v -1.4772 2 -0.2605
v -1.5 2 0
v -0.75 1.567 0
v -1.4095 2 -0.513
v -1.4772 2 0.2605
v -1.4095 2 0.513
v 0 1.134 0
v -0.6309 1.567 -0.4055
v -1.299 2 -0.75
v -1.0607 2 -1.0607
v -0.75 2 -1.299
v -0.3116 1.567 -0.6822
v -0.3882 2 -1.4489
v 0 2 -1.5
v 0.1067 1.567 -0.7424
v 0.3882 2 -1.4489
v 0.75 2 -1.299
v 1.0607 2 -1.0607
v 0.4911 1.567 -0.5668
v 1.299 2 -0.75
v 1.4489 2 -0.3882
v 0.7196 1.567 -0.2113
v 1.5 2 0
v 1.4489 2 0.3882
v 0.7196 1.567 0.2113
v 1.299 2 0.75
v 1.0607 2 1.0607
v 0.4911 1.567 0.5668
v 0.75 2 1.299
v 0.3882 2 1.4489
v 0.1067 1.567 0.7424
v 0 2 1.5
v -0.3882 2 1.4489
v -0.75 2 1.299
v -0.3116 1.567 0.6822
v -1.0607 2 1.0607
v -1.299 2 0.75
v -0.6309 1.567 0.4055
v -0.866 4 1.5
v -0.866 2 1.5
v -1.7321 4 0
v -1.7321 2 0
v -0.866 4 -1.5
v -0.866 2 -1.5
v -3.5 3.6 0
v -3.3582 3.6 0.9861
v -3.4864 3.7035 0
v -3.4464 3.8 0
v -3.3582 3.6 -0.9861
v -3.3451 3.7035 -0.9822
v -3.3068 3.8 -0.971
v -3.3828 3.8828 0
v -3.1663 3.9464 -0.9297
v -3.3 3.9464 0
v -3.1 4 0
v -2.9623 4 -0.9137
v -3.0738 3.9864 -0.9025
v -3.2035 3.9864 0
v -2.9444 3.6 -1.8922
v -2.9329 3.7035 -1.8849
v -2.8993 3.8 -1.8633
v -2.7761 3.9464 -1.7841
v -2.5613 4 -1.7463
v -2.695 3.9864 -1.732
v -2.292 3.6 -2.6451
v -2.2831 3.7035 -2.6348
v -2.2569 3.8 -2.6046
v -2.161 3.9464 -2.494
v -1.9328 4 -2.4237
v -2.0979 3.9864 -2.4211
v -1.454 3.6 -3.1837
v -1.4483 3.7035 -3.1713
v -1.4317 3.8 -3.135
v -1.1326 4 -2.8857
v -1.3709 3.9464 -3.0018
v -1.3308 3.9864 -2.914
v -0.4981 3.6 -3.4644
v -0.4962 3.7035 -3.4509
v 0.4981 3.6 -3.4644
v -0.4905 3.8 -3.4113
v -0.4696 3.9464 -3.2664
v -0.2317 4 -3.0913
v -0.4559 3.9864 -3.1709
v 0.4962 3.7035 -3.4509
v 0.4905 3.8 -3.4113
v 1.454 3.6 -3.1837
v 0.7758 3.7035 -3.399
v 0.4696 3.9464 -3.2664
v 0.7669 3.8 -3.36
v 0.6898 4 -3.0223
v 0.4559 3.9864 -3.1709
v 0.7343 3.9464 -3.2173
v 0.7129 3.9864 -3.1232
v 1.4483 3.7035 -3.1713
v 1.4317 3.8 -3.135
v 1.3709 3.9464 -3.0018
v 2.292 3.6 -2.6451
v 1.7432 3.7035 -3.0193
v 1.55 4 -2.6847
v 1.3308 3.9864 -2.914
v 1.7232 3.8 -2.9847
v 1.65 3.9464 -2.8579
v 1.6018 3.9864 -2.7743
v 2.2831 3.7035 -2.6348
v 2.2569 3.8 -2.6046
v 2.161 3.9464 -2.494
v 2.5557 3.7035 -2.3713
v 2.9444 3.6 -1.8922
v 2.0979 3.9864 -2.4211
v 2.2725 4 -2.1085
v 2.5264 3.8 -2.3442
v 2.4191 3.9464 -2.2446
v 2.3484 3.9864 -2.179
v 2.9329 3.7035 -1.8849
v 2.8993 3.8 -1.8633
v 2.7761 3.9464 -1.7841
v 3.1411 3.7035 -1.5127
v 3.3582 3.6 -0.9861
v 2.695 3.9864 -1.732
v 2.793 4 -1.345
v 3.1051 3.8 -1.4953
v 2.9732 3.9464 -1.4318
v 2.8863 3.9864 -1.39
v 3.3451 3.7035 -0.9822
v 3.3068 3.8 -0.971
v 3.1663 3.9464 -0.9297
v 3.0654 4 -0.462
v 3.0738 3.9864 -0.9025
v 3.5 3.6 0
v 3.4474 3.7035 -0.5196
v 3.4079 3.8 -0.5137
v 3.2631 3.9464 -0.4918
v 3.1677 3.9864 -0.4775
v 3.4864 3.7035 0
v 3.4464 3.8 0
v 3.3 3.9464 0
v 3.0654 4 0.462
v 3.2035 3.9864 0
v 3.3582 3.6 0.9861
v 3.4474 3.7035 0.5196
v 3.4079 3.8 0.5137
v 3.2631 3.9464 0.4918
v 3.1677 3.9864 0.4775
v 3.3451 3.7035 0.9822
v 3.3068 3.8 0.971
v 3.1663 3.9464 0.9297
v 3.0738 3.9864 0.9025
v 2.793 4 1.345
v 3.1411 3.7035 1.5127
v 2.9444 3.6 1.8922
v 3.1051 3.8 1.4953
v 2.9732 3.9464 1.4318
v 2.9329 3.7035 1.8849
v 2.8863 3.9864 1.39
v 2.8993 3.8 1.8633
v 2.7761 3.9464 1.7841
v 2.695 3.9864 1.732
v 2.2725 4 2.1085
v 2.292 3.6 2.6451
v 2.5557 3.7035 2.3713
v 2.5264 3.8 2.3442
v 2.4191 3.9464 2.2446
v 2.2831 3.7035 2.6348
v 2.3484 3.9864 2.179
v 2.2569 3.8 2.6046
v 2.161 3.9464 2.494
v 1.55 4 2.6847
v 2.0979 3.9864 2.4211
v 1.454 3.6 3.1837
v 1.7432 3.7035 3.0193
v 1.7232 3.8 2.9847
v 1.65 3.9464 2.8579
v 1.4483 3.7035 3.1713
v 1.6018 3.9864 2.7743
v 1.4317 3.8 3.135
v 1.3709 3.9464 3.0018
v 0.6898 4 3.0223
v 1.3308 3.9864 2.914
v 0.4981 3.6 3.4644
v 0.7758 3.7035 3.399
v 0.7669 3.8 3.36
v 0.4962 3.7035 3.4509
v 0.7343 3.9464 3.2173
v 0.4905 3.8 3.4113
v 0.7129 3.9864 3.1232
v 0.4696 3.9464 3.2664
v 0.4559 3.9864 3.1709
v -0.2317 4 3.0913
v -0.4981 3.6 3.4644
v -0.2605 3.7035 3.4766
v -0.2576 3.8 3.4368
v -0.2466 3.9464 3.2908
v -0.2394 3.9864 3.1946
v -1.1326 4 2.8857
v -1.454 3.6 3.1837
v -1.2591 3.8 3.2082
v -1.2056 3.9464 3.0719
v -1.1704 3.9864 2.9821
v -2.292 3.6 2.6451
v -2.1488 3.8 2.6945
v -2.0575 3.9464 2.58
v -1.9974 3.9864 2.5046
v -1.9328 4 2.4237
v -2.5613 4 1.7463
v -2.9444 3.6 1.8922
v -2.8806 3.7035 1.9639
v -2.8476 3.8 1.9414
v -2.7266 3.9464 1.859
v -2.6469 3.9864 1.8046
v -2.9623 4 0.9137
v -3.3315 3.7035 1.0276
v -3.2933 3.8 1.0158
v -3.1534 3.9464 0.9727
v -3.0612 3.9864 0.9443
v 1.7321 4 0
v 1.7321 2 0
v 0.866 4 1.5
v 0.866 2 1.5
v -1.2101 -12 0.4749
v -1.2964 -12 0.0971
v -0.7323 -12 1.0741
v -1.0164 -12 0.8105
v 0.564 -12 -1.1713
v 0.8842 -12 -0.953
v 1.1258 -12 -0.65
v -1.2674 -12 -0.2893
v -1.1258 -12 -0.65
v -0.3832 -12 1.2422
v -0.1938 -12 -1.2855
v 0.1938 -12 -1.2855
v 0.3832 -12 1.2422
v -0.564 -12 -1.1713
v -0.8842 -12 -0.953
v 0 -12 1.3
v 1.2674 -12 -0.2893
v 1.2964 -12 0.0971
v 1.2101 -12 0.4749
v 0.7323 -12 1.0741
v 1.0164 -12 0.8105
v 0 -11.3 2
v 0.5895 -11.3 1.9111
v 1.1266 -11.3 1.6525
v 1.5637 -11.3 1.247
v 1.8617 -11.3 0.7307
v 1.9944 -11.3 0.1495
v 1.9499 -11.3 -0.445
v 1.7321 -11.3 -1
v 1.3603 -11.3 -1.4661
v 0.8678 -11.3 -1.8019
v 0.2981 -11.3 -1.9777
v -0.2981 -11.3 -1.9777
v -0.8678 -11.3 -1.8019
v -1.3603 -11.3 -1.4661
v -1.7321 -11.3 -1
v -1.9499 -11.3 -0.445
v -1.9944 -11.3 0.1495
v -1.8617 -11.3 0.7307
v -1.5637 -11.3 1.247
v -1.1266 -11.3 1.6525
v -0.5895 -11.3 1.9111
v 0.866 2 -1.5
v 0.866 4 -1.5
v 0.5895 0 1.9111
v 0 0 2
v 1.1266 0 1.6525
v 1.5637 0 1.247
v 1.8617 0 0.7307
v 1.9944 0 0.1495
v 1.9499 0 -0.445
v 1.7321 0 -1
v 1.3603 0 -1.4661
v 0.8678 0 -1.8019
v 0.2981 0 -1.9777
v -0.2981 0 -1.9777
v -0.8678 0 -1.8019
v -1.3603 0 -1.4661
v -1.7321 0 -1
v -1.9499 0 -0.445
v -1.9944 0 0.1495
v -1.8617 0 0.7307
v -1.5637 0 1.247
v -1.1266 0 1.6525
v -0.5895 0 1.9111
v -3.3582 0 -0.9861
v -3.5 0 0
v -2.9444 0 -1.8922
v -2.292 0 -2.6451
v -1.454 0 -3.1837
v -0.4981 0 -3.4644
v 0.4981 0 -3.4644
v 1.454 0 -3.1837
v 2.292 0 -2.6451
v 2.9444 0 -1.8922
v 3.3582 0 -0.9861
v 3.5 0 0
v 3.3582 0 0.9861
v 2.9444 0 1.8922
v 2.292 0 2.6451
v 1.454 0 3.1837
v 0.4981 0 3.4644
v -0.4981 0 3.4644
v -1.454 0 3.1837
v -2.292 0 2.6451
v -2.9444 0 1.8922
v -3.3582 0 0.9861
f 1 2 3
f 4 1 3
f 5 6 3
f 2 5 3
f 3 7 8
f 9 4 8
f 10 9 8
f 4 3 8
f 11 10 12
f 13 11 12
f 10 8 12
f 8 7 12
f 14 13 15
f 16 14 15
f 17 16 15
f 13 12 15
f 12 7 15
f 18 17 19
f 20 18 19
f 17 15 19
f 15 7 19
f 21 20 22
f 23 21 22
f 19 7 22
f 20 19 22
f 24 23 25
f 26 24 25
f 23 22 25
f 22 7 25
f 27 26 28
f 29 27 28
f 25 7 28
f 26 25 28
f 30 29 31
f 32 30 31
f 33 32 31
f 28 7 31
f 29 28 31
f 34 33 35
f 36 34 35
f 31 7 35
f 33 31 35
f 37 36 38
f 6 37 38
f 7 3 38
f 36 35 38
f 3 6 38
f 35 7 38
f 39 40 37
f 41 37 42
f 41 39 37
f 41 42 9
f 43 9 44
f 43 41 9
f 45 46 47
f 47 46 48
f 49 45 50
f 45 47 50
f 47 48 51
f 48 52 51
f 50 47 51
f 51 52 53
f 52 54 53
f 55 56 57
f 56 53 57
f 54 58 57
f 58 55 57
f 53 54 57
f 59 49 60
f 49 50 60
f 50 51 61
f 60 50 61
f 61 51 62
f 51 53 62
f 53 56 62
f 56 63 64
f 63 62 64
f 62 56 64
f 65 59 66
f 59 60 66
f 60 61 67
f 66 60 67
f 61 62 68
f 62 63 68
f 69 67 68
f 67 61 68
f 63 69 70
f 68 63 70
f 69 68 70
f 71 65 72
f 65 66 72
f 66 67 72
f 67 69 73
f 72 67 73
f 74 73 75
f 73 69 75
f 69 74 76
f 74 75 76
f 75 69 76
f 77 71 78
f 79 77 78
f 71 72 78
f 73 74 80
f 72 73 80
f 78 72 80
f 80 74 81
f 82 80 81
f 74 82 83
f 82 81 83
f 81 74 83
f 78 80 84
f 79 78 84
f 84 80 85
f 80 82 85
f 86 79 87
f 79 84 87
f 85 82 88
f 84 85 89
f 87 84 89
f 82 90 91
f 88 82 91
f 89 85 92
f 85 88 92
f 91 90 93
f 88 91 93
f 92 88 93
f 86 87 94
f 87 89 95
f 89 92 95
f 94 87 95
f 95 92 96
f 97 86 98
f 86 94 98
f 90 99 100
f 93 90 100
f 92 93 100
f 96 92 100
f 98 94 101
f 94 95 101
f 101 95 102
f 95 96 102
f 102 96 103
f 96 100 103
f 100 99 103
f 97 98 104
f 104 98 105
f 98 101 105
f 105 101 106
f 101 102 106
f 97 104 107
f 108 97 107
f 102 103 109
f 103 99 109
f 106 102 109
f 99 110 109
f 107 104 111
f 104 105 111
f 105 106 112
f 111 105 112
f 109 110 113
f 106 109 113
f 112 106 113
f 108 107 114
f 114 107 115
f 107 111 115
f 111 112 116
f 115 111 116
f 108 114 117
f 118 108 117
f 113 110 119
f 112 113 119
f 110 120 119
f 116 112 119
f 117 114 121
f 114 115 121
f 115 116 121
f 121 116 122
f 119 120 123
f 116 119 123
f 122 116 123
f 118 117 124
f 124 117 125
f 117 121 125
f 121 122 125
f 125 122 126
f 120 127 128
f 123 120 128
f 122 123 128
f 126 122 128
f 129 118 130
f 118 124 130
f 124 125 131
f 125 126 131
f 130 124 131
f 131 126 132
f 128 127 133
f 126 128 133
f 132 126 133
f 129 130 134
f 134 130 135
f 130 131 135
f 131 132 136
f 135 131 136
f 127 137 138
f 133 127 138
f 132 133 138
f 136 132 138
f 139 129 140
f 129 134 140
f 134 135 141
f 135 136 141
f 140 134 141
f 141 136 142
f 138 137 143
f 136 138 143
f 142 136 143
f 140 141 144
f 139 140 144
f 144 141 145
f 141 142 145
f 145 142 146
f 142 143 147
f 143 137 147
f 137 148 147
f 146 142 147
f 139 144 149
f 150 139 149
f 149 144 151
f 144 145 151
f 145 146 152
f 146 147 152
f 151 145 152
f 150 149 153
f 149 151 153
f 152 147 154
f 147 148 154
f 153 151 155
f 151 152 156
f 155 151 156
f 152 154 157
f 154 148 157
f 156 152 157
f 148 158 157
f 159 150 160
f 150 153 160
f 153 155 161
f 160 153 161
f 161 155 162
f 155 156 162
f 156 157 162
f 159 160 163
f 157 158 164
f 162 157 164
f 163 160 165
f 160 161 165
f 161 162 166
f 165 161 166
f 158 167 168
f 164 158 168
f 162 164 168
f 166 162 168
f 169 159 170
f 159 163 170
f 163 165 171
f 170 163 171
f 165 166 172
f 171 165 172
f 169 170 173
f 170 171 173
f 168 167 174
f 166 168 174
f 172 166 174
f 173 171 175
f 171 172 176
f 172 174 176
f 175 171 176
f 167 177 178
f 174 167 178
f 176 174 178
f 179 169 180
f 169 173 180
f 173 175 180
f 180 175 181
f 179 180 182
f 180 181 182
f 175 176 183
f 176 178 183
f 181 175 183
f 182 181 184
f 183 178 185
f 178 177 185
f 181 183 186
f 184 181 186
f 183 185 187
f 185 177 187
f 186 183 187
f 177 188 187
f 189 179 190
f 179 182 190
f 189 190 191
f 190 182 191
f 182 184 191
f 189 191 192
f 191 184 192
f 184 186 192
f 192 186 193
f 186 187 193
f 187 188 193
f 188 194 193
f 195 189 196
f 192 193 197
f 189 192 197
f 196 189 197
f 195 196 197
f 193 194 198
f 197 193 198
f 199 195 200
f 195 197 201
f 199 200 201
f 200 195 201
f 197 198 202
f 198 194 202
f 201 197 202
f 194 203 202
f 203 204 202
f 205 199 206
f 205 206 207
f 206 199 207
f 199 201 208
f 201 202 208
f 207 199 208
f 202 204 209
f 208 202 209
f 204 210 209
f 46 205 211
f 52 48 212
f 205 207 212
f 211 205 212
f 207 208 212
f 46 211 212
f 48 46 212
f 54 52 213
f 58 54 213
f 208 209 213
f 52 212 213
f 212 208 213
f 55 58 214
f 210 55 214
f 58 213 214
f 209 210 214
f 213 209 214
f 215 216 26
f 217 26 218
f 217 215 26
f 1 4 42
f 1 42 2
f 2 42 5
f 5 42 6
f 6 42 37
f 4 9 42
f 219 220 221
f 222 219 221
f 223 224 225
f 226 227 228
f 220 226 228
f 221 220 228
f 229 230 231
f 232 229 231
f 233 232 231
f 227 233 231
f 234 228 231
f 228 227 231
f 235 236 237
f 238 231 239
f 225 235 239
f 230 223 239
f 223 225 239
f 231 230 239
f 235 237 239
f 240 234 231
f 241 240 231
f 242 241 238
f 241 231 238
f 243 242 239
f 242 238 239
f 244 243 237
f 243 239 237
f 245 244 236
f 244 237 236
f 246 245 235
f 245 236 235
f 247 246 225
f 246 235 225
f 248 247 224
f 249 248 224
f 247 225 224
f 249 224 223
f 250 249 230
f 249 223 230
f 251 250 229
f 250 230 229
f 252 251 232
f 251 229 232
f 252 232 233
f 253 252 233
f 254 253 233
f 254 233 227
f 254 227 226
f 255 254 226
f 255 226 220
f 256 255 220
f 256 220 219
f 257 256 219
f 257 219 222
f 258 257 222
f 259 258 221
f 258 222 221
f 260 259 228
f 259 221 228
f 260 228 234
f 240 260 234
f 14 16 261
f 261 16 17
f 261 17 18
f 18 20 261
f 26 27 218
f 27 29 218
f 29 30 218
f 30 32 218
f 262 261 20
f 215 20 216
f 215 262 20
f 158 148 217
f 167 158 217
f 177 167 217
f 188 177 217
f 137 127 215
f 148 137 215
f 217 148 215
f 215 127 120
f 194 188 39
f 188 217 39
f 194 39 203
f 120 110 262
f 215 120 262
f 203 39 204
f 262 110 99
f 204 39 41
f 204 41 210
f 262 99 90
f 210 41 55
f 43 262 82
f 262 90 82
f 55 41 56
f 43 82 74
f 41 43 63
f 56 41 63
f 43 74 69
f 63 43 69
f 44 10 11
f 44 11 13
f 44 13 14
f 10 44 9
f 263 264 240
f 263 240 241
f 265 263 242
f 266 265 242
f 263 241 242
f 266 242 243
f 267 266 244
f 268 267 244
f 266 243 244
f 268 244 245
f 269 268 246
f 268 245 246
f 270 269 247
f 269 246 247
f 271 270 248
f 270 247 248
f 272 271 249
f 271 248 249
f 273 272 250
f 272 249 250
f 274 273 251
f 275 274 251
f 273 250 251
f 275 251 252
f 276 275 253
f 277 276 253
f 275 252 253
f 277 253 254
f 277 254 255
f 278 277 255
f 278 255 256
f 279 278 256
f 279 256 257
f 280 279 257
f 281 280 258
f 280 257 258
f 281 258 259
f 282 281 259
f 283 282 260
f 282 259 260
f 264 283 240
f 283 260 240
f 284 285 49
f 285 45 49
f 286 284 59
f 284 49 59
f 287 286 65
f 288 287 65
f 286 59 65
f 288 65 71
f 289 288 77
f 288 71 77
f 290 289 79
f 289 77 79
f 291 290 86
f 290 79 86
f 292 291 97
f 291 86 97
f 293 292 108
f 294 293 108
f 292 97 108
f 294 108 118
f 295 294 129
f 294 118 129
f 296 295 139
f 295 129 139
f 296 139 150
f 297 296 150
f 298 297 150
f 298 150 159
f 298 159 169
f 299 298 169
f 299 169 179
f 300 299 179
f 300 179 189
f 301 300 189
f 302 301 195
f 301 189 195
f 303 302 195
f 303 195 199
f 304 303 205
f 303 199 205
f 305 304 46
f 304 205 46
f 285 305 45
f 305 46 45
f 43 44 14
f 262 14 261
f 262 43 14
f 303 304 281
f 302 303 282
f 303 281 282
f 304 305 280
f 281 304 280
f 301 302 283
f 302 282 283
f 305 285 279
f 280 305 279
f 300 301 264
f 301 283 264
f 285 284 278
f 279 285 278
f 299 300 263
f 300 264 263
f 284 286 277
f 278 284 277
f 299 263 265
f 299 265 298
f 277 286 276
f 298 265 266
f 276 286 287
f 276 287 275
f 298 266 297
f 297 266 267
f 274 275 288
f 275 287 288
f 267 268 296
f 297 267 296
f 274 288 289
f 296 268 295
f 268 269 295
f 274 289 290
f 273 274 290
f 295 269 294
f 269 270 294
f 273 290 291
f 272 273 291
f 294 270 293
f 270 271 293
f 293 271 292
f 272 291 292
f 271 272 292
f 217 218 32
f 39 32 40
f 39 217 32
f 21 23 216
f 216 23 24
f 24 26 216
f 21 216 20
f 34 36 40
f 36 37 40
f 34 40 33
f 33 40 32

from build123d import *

# Parameters (mm, degrees)
TIGE_START              = -12
ESQUISSE1_R             = 2
TIGE_DEPTH              = 12
CHANFREIN_D_ENTR_E_SIZE = 0.7
HEXAGONE_DEPTH          = 2


with BuildPart() as part:
    # Esquisse1 → Tige (new body)
    with BuildSketch(Plane(origin=(0, 0, 0), x_dir=(1, 0, 0), z_dir=(0, 1, 0)).offset(TIGE_START)):
        with Locations(Location((0, 0, 0), (0, 0, 270))):
            Circle(ESQUISSE1_R)
    extrude(amount=TIGE_DEPTH)

    # Chanfrein d'entrée
    chanfrein_d_entr_e_edges = [part.edges().sort_by_distance(p)[0] for p in [
        (0, -12, -2),
    ]]
    chamfer(chanfrein_d_entr_e_edges, length=CHANFREIN_D_ENTR_E_SIZE)

    # Esquisse2 → Tête (revolve)
    with BuildSketch(Plane.XY, mode=Mode.PRIVATE) as t_te_sk:
        with BuildLine():
            Line((1.5, 4), (1.5, 2))
            Line((1.5, 2), (0, 1.133974596))
            Line((0, 1.133974596), (0, 0))
            Line((0, 0), (3.5, 0))
            Line((3.5, 0), (3.5, 3.6))
            ThreePointArc((3.5, 3.6), (3.382842712, 3.882842712), (3.1, 4))
            Line((3.1, 4), (1.5, 4))
        make_face()
    revolve(t_te_sk.sketch.rotate(Axis((0, 4, 0), (0, -1, 0)), 180), axis=Axis((0, 4, 0), (0, -1, 0)))

    # Esquisse3 → Hexagone (cut)
    with BuildSketch(Plane(origin=(0, 4, -3), x_dir=(1, 0, 0), z_dir=(0, -1, 0))):
        Polygon((0.866025404, 4.5), (-0.866025404, 4.5), (-1.732050808, 3), (-0.866025404, 1.5), (0.866025404, 1.5), (1.732050808, 3), align=None)
    extrude(amount=HEXAGONE_DEPTH, mode=Mode.SUBTRACT)


solid = part.part
